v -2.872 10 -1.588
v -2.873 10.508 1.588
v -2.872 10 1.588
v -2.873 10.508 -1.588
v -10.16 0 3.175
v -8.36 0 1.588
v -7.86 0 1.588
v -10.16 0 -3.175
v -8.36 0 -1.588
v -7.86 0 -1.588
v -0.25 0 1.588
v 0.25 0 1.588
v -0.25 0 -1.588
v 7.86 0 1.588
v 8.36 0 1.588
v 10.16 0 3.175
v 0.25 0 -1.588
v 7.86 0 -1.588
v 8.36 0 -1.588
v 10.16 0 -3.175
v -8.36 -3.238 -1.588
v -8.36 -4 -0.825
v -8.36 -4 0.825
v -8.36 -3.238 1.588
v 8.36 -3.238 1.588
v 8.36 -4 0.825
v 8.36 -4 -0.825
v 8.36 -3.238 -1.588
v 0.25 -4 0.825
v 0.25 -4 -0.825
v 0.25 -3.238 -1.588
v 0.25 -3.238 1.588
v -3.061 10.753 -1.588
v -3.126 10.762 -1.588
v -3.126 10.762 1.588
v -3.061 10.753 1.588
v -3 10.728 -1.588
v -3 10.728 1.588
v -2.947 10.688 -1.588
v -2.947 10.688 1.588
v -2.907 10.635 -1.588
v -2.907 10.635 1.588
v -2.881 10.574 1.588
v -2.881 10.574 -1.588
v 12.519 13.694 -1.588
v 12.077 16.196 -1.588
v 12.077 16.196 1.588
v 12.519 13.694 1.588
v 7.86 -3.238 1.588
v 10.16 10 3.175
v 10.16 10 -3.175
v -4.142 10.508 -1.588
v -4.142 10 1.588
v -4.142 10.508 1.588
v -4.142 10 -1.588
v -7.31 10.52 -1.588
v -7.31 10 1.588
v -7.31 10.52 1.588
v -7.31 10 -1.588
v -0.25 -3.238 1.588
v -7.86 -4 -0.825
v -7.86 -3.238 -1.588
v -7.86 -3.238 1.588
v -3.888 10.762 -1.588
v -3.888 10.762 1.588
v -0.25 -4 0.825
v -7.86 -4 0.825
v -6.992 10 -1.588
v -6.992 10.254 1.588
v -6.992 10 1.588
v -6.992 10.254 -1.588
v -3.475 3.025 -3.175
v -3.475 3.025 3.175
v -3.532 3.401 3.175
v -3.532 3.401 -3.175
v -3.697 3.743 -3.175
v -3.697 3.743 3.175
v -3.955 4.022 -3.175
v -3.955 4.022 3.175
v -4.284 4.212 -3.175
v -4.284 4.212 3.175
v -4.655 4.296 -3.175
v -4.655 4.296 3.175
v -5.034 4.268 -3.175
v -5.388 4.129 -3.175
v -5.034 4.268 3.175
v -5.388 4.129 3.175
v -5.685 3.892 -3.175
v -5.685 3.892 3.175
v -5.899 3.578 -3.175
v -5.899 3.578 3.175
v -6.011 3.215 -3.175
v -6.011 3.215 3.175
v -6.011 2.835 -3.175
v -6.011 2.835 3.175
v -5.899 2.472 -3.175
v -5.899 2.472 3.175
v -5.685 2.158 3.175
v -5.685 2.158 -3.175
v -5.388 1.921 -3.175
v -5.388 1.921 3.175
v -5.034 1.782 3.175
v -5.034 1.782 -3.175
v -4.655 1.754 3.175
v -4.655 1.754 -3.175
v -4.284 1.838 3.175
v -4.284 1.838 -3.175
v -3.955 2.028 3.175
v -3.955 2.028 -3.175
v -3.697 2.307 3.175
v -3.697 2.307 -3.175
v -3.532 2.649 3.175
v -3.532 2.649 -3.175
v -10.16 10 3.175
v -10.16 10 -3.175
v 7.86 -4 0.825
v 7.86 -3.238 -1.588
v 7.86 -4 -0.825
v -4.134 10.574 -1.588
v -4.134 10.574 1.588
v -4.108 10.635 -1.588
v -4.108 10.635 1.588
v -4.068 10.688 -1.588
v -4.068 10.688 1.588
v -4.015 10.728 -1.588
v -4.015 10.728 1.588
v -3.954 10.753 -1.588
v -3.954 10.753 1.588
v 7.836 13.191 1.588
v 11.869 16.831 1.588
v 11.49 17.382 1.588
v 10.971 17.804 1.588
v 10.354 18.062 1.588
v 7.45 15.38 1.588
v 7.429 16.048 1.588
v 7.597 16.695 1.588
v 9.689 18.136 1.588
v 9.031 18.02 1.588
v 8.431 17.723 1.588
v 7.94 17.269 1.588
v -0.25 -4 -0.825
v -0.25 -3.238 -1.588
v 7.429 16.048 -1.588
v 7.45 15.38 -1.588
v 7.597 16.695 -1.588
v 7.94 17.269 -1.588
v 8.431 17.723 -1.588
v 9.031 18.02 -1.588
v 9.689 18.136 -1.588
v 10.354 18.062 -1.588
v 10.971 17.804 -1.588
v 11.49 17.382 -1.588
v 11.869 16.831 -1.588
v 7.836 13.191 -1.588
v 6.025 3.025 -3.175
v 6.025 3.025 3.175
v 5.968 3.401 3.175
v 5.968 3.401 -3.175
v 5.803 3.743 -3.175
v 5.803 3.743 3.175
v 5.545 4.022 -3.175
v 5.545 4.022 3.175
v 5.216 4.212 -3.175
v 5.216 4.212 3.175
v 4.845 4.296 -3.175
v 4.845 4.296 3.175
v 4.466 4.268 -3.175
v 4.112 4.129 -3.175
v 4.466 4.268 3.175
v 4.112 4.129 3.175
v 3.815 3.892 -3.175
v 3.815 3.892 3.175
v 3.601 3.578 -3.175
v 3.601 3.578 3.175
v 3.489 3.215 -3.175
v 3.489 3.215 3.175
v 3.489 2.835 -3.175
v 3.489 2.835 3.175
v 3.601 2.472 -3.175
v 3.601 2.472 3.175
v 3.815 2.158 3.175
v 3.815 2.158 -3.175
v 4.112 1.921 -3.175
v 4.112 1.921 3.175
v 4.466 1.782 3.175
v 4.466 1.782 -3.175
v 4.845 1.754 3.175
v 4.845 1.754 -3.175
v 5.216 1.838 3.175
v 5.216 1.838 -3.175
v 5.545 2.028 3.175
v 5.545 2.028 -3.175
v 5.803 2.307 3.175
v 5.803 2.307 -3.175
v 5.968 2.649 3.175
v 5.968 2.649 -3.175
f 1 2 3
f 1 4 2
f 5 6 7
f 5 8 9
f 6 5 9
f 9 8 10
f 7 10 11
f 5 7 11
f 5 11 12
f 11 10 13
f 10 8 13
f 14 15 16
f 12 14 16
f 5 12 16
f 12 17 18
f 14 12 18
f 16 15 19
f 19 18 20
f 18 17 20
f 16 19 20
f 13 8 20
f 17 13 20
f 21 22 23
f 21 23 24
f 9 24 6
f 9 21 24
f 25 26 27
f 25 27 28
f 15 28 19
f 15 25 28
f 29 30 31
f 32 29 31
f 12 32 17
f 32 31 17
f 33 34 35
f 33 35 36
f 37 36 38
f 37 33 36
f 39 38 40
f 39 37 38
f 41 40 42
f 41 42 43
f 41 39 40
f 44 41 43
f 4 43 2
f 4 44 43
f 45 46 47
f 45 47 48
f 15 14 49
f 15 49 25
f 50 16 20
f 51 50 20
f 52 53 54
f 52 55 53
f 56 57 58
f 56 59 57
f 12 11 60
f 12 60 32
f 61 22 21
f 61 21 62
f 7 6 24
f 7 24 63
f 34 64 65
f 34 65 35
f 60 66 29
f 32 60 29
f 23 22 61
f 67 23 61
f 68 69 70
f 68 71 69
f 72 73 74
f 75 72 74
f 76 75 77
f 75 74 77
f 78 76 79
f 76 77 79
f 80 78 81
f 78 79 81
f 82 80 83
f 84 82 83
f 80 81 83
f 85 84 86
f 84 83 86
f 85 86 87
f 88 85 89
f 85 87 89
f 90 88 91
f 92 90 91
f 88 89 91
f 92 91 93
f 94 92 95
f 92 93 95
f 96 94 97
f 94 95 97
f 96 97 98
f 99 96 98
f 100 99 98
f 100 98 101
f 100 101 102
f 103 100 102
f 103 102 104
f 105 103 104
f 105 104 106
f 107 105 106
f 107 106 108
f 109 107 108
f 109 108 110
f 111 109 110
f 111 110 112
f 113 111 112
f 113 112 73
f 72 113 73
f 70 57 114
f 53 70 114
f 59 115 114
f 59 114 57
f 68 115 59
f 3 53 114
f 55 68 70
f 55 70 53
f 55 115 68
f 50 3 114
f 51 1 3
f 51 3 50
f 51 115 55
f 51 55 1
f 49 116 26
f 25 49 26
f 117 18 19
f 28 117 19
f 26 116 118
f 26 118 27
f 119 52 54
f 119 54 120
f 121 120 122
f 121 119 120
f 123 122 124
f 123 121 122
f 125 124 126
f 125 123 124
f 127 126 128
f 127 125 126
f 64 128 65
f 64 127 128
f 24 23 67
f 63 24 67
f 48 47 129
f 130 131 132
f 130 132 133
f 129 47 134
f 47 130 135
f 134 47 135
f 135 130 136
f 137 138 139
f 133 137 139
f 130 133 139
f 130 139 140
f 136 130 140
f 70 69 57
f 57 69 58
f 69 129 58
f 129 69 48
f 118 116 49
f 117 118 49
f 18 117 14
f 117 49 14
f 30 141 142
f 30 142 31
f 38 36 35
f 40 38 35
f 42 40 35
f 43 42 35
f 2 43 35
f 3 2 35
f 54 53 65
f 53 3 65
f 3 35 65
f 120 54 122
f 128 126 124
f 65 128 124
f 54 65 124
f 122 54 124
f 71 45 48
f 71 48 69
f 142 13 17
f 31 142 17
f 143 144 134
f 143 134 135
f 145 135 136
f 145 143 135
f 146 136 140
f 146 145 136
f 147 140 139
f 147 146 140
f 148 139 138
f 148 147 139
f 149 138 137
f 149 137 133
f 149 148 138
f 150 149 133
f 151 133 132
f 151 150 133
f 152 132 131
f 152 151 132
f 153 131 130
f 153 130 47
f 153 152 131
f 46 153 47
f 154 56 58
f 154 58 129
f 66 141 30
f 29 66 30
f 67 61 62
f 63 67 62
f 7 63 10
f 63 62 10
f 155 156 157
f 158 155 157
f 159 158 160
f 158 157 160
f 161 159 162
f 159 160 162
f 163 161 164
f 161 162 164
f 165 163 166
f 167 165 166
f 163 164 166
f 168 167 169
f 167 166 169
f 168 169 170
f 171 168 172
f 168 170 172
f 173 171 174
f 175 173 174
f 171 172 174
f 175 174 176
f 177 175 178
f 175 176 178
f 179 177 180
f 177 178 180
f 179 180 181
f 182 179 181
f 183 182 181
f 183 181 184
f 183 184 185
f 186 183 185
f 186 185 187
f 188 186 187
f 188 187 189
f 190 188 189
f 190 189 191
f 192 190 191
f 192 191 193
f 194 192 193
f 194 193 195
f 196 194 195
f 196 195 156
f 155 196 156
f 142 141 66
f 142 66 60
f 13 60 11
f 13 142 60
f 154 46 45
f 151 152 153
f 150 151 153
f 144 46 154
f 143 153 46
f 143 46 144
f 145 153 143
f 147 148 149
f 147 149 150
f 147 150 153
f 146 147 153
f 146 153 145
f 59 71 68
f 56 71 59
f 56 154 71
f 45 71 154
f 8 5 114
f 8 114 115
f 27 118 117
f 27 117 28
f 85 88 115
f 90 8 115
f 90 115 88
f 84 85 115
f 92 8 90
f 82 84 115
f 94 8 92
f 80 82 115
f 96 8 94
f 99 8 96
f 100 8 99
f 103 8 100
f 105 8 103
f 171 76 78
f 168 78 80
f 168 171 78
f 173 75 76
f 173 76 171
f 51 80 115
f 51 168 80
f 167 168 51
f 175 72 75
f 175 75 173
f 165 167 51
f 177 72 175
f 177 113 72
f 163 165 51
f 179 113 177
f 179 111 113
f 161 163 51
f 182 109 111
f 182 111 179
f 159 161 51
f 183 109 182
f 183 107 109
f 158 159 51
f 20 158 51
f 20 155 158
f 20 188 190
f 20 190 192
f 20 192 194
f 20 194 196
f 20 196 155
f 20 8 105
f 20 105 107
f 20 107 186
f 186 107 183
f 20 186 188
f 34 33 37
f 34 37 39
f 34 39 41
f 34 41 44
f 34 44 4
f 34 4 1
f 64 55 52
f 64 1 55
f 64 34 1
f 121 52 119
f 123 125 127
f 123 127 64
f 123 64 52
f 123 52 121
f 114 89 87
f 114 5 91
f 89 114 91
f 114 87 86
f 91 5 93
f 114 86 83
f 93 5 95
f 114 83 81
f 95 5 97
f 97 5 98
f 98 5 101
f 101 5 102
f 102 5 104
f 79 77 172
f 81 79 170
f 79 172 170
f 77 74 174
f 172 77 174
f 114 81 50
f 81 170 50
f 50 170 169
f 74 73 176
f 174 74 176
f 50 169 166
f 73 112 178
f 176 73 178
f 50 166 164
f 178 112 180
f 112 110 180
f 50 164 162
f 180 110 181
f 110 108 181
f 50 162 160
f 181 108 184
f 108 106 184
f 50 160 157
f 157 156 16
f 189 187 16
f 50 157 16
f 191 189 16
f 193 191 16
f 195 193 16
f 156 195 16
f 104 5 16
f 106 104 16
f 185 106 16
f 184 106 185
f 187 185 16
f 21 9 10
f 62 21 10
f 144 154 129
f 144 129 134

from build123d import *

# Parameters (mm, degrees)
SKETCH1_W           = 20.32
SKETCH1_H           = 6.35
BOSS_EXTRUDE1_DEPTH = 10
SKETCH2_W           = 0.5
SKETCH2_H           = 4
BOSS_EXTRUDE2_DEPTH = 1.5875
CHAMFER1_SIZE       = 0.762
SKETCH3_R           = 1.275
CUT_EXTRUDE1_DEPTH  = 23.934585372


with BuildPart() as part:
    # Sketch1 → Boss-Extrude1 (new body)
    with BuildSketch(Plane(origin=(0, 0, 0), x_dir=(1, 0, 0), z_dir=(0, 1, 0))):
        Rectangle(SKETCH1_W, SKETCH1_H)
    extrude(amount=BOSS_EXTRUDE1_DEPTH)

    # Sketch2 → Boss-Extrude2 (add, symmetric)
    with BuildSketch(Plane.XY):
        with BuildLine():
            Line((-4.1425, 10), (-4.1425, 10.508))
            ThreePointArc((-4.1425, 10.508), (-4.068105122, 10.687605122), (-3.8885, 10.762))
            Line((-3.8885, 10.762), (-3.1265, 10.762))
            ThreePointArc((-3.1265, 10.762), (-2.946894878, 10.687605122), (-2.8725, 10.508))
            Line((-2.8725, 10.508), (-2.8725, 10))
            Line((-2.8725, 10), (-4.1425, 10))
        make_face()
        with BuildLine():
            Line((-7.31, 10), (-7.31, 10.520414133))
            Line((-7.31, 10.520414133), (7.835766275, 13.191021371))
            Line((7.835766275, 13.191021371), (7.4498332, 15.379756602))
            ThreePointArc((7.4498332, 15.379756602), (9.355652622, 18.101548811), (12.077444831, 16.195729389))
            Line((12.077444831, 16.195729389), (12.518511203, 13.694317696))
            Line((12.518511203, 13.694317696), (-6.9925, 10.254))
            Line((-6.9925, 10.254), (-6.9925, 10))
            Line((-6.9925, 10), (-7.31, 10))
        make_face()
        with Locations((-8.11, -2)):
            Rectangle(SKETCH2_W, SKETCH2_H)
        with Locations((0, -2)):
            Rectangle(SKETCH2_W, SKETCH2_H)
        with Locations((8.11, -2)):
            Rectangle(SKETCH2_W, SKETCH2_H)
    extrude(amount=BOSS_EXTRUDE2_DEPTH, both=True)

    # Chamfer1
    chamfer1_edges = [part.edges().sort_by_distance(p)[0] for p in [
        (-8.11, -4, -1.5875),
        (-8.11, -4, 1.5875),
        (0, -4, -1.5875),
        (0, -4, 1.5875),
        (8.11, -4, -1.5875),
        (8.11, -4, 1.5875),
    ]]
    chamfer(chamfer1_edges, length=CHAMFER1_SIZE)

    # Sketch3 → Cut-Extrude1 (cut, through all)
    with BuildSketch(Plane.XY.offset(3.175)):
        with Locations((-4.75, 3.025)):
            Circle(SKETCH3_R)
        with Locations((4.75, 3.025)):
            Circle(SKETCH3_R)
    extrude(amount=-CUT_EXTRUDE1_DEPTH, mode=Mode.SUBTRACT)


solid = part.part
